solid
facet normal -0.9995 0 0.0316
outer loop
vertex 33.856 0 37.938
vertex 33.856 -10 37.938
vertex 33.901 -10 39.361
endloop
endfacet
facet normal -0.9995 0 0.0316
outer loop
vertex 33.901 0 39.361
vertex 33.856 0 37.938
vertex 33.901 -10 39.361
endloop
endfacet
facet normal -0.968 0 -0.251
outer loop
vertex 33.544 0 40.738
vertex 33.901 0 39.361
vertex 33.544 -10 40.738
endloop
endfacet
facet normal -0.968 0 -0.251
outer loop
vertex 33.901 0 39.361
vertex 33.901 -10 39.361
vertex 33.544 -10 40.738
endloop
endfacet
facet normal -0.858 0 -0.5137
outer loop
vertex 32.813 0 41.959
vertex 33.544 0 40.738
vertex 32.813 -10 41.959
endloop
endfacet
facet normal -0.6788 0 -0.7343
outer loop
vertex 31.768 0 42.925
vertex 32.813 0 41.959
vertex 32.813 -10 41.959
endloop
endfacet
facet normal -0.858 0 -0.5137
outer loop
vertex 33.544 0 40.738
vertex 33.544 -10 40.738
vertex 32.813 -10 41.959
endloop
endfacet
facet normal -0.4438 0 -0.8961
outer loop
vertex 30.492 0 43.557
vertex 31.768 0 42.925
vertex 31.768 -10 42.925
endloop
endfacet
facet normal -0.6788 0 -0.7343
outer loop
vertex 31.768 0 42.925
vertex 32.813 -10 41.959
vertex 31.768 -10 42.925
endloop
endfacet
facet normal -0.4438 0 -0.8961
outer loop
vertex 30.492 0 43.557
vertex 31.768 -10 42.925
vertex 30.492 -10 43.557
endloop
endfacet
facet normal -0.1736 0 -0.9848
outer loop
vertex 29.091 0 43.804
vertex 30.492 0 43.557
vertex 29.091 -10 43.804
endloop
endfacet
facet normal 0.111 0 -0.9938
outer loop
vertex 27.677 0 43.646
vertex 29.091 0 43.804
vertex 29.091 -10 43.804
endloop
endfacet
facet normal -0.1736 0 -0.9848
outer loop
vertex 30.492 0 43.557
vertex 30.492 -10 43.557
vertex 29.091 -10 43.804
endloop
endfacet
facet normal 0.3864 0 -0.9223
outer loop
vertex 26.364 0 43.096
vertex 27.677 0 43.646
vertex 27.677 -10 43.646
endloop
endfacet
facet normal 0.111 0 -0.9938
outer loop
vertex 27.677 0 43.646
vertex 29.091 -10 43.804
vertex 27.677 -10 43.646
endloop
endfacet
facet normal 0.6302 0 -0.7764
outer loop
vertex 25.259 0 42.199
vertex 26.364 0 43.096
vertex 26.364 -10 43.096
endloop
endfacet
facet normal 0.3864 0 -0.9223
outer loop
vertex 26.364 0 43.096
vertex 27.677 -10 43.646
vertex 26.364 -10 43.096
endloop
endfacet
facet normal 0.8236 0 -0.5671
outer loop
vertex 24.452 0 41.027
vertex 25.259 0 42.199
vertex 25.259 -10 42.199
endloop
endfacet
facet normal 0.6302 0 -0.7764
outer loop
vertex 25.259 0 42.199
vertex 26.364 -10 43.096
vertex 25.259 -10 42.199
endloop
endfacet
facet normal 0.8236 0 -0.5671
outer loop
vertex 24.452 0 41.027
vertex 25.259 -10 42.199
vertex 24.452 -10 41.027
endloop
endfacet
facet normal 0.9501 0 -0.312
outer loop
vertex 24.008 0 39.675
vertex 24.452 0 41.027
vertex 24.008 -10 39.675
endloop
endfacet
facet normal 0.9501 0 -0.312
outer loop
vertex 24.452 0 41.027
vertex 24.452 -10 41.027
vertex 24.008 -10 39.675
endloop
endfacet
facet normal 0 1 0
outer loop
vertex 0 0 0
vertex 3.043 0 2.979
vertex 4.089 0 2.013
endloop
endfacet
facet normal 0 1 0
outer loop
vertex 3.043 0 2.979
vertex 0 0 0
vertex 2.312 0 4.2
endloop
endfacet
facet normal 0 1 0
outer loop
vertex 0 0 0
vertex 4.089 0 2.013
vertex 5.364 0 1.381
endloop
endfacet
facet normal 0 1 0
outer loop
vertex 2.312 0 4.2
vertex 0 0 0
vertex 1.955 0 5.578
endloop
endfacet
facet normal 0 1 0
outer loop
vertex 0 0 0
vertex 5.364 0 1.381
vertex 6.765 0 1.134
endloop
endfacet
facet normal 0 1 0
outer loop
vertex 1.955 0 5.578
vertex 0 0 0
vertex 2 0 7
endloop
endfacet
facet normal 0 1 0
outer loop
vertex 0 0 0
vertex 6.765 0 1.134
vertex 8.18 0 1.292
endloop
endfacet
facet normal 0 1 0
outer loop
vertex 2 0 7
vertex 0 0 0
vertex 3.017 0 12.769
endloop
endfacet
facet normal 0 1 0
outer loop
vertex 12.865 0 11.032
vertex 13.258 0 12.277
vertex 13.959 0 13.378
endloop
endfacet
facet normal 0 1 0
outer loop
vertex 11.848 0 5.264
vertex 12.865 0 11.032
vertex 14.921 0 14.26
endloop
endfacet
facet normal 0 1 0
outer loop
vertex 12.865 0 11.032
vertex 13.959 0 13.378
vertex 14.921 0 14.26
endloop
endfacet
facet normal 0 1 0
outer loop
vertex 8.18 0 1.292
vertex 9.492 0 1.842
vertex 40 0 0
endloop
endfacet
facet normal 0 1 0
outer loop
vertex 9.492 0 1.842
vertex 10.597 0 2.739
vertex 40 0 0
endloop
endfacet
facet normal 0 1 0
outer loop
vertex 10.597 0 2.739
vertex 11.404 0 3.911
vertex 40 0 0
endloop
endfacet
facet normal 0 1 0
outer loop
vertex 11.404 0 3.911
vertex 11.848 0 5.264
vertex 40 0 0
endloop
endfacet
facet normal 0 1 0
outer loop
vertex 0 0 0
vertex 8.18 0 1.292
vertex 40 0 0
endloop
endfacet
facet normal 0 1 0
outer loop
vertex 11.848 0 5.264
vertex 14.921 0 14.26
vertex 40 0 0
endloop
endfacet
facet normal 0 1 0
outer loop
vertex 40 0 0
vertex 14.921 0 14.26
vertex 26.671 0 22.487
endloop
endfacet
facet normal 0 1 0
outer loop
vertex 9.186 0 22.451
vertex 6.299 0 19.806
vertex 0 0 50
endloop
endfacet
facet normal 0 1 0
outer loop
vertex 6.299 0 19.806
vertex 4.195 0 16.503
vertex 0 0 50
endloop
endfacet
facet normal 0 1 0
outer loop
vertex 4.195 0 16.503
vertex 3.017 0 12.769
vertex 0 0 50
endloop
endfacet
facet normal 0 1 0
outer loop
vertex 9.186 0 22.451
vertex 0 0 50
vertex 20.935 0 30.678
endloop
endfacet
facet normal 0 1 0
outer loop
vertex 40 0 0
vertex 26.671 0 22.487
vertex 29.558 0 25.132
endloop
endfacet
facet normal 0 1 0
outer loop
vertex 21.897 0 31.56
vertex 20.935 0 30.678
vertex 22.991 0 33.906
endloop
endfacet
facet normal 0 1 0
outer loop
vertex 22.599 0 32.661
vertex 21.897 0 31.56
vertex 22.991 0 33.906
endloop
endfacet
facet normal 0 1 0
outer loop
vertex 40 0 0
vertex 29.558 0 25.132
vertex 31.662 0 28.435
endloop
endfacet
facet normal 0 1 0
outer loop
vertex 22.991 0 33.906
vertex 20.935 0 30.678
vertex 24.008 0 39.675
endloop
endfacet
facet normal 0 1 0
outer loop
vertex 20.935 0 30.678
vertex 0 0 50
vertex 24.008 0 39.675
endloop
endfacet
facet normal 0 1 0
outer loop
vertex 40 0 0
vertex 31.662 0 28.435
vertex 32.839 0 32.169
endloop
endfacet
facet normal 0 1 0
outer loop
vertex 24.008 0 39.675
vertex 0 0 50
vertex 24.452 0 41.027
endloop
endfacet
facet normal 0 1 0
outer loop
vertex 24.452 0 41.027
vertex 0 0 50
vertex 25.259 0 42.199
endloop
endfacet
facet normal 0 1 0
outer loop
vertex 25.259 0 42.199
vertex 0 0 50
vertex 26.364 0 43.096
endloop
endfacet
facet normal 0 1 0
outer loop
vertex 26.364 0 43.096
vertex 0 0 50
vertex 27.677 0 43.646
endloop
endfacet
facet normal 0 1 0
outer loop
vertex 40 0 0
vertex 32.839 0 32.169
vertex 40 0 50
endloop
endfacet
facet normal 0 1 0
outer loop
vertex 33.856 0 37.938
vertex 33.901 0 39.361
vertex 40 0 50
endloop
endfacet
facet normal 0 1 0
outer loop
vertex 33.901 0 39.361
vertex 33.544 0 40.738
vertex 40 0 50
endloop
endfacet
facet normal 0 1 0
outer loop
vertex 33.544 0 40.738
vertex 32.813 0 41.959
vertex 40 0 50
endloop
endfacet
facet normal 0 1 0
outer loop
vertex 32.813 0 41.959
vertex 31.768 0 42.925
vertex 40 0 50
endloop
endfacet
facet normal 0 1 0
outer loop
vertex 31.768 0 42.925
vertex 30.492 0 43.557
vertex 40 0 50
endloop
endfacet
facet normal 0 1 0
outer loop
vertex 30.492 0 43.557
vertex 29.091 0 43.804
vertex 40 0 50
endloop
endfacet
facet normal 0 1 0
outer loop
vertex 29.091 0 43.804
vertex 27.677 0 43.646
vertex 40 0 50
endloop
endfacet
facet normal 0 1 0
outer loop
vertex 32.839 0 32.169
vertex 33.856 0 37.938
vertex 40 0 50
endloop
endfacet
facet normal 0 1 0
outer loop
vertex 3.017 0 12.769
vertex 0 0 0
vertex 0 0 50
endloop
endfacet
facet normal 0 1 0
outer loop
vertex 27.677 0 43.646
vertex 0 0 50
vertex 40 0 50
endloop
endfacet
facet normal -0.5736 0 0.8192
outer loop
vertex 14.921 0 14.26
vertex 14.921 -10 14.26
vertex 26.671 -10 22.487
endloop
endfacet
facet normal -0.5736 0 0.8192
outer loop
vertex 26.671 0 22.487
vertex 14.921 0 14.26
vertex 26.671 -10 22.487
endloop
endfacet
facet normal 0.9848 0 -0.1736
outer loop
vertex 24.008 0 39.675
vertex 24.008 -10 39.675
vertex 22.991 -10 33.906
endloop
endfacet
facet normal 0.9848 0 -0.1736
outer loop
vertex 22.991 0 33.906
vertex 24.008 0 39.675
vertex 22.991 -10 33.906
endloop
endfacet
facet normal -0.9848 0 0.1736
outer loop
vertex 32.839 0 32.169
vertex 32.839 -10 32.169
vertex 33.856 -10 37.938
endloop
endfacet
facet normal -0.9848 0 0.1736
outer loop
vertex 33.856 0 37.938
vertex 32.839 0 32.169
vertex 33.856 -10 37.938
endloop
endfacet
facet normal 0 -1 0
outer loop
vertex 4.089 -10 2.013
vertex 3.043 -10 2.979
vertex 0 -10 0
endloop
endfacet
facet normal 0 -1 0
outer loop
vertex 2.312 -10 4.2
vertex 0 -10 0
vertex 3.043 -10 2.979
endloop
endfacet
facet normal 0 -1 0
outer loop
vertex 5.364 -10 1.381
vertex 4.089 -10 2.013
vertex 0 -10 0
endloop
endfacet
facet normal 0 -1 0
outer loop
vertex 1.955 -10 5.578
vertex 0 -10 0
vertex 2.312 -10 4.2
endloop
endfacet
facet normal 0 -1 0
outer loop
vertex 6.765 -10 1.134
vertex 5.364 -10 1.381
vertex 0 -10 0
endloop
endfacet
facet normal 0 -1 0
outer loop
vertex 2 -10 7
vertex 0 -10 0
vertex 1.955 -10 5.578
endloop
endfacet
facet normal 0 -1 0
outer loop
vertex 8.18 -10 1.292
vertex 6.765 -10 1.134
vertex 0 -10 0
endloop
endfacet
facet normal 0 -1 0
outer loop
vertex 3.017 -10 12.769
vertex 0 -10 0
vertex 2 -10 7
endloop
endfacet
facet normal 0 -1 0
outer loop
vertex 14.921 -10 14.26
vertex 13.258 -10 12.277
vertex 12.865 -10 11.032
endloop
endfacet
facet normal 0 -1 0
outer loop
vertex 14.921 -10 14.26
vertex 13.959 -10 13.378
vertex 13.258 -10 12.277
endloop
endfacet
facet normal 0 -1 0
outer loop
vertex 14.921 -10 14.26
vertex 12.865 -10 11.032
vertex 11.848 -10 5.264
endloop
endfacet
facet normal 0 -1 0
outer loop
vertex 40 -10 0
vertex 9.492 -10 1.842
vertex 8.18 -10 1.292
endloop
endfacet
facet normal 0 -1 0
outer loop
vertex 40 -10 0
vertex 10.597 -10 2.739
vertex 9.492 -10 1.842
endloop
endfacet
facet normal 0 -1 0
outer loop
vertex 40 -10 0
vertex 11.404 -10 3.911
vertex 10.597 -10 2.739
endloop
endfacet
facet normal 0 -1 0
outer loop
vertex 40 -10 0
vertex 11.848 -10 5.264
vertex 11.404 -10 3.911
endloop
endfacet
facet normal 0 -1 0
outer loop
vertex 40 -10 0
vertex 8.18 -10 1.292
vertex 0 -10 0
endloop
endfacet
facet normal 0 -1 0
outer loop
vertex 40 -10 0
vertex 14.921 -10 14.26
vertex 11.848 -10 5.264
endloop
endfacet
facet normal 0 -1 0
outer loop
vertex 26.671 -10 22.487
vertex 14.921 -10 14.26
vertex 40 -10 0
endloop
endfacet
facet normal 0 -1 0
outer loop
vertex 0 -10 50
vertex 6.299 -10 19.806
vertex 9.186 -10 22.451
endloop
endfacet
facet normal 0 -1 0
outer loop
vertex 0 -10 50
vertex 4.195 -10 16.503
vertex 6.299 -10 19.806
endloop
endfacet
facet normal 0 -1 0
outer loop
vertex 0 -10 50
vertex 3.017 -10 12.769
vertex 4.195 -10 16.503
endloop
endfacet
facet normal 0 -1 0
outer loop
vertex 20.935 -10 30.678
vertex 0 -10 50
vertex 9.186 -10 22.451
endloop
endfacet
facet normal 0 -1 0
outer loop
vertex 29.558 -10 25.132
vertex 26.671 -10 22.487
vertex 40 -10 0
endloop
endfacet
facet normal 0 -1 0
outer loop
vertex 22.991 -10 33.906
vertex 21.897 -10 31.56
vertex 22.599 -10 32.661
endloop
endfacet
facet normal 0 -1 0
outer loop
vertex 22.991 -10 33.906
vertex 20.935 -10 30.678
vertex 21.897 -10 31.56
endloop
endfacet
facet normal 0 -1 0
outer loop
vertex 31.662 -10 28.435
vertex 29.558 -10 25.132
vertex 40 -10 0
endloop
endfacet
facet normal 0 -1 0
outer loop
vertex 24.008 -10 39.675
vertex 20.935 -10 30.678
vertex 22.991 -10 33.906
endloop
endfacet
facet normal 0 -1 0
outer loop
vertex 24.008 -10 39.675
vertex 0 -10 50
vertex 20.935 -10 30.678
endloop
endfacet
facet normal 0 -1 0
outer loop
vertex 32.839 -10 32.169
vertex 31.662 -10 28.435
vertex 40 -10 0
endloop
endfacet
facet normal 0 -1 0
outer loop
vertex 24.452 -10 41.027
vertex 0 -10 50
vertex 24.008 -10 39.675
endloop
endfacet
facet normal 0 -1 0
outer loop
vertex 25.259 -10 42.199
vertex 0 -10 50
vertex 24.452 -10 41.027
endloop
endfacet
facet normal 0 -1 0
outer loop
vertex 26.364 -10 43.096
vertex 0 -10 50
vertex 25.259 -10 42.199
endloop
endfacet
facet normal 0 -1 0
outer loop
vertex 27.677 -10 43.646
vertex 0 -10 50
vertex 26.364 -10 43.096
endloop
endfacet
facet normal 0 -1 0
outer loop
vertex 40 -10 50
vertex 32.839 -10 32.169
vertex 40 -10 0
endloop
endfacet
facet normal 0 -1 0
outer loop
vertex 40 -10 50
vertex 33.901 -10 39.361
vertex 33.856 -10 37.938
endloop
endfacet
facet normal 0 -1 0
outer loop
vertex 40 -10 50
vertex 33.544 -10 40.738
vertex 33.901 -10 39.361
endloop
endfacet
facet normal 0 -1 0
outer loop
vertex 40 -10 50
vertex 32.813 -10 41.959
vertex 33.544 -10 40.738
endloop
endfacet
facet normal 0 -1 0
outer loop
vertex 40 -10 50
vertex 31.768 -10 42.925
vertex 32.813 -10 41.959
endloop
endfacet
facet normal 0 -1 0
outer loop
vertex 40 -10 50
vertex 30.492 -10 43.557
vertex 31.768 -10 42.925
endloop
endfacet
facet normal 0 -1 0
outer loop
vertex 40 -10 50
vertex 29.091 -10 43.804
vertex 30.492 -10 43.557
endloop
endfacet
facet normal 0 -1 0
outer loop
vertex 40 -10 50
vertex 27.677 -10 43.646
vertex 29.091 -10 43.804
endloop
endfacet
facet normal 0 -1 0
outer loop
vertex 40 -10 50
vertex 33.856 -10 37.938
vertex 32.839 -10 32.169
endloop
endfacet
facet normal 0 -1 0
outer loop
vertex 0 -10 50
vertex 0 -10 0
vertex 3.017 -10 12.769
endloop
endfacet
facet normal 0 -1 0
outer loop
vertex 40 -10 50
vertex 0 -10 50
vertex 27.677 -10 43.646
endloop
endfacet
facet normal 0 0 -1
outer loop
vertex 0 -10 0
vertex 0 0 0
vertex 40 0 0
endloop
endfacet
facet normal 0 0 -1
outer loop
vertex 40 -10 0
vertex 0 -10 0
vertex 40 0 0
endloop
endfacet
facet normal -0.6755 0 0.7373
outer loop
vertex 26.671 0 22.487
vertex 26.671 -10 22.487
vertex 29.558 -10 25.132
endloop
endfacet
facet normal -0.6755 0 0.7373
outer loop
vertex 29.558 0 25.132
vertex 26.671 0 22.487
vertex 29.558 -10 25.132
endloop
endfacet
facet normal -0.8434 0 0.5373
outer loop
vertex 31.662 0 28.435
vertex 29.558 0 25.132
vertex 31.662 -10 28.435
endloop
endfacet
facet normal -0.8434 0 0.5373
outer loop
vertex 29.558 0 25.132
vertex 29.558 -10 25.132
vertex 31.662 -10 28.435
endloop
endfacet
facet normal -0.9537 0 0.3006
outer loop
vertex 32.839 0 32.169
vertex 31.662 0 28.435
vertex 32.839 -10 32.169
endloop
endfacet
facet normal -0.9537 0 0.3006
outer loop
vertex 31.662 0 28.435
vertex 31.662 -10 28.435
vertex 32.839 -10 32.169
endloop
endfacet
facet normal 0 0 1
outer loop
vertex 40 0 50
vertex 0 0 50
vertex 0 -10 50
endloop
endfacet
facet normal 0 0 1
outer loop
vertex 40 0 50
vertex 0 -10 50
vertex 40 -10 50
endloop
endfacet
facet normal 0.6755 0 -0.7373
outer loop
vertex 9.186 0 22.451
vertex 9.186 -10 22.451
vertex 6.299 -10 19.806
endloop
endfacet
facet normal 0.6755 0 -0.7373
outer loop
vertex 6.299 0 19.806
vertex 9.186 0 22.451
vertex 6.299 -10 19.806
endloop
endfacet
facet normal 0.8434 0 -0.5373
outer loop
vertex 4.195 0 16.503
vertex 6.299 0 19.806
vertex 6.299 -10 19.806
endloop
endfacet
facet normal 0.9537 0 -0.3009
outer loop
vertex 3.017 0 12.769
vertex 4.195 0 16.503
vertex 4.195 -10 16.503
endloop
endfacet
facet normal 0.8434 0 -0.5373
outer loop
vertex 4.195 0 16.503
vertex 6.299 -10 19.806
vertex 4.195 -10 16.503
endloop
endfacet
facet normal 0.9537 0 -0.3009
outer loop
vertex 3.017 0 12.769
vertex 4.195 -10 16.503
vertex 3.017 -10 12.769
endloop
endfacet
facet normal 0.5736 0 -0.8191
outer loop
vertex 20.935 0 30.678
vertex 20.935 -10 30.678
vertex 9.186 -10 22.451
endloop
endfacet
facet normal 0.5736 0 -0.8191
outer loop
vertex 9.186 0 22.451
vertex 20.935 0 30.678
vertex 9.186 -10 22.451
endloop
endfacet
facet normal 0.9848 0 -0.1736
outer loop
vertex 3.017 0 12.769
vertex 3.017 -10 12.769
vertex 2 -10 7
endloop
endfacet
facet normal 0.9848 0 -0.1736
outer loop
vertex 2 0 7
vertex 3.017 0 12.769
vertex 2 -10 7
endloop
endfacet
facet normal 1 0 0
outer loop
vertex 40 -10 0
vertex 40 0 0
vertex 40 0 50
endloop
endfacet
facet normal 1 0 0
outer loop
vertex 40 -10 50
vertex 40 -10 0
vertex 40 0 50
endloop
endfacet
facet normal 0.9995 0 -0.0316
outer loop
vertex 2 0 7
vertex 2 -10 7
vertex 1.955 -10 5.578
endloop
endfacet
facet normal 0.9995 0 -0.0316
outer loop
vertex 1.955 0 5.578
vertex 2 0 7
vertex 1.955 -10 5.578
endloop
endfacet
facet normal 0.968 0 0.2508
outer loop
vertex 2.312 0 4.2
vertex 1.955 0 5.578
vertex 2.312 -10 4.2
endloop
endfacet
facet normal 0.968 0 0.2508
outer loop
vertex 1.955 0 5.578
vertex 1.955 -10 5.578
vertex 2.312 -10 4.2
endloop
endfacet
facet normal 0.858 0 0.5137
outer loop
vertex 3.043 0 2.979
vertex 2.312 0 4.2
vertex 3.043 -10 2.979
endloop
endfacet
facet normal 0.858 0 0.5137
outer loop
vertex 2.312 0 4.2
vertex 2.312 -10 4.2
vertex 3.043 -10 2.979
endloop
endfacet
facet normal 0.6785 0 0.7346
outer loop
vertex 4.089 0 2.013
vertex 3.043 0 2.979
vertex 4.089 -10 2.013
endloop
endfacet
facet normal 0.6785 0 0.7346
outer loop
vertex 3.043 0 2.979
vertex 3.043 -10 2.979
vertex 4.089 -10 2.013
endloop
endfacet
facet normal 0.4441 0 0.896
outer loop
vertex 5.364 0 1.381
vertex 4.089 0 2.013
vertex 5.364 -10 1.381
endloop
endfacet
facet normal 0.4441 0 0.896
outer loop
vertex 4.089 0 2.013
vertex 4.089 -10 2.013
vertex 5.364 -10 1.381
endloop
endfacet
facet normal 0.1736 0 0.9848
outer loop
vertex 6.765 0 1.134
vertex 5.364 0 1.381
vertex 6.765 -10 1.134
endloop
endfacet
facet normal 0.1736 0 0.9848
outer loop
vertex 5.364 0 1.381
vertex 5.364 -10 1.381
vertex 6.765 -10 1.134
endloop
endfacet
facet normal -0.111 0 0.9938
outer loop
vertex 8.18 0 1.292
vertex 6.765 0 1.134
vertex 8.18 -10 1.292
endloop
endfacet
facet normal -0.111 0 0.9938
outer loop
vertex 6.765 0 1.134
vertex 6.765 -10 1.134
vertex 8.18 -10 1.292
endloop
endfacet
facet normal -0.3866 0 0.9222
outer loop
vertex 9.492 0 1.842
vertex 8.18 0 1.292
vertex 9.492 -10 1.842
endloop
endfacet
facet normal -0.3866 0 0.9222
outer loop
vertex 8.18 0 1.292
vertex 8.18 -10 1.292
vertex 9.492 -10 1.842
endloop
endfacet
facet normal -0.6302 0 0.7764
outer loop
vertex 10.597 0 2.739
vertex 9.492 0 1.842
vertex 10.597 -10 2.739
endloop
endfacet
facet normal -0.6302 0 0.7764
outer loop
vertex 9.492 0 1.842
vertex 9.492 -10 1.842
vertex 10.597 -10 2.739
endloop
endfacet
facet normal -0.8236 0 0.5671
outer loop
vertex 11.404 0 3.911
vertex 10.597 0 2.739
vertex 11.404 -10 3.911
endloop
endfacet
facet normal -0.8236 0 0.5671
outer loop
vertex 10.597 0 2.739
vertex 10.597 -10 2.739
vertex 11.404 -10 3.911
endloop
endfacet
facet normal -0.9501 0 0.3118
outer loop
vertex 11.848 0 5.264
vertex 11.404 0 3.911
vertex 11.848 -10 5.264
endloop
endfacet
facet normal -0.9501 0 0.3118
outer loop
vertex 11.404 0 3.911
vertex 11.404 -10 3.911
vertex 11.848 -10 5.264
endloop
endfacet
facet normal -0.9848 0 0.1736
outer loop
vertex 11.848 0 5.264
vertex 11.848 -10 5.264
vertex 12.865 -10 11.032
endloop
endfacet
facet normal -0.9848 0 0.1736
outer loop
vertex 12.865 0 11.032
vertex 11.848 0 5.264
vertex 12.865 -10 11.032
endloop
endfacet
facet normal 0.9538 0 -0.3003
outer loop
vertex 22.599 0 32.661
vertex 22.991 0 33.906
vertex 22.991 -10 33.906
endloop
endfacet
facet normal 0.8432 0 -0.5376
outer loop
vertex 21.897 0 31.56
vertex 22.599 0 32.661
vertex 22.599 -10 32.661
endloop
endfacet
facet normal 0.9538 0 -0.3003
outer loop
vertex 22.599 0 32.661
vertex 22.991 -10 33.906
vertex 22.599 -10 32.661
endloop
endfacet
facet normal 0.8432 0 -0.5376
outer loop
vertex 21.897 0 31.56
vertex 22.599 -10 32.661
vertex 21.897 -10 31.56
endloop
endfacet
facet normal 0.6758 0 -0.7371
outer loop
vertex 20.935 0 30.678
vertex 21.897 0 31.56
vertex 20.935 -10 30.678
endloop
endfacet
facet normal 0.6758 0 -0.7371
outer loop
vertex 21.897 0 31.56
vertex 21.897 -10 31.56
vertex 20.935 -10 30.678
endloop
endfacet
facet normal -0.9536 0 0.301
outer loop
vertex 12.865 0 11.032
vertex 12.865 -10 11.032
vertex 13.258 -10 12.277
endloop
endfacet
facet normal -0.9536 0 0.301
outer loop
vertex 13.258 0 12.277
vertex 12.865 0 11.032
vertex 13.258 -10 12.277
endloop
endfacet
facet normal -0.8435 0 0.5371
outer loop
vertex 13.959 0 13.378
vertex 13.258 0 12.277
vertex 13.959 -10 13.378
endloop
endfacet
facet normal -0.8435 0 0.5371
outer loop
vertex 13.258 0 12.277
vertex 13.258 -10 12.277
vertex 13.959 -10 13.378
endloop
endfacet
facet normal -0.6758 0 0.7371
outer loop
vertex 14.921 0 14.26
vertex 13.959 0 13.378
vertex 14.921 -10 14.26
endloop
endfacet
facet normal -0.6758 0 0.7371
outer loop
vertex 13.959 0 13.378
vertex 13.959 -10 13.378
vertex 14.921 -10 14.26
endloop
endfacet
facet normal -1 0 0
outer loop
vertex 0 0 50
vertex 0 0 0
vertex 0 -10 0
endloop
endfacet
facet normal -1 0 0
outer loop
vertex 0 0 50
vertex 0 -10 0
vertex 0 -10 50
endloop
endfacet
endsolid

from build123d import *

# Parameters (mm, degrees)
F0_W     = 40
F0_H     = 50
F1_DEPTH = 10
F3_DEPTH = 10.001


with BuildPart() as f1:
    # F0 (on Front) → F1 (new body)
    with BuildSketch(Plane.XZ):
        with Locations((20, 25)):
            Rectangle(F0_W, F0_H)
    extrude(amount=F1_DEPTH)

    # F2 (on face) → F3 (cut, through all)
    with BuildSketch(Plane.XZ.offset(10)):
        with BuildLine():
            Line((3.017207, 12.76887), (2, 7))
            ThreePointArc((2, 7), (6.055798, 1.20772), (11.848078, 5.263518))
            Line((11.848078, 5.263518), (12.865285, 11.032388))
            ThreePointArc((12.865285, 11.032388), (13.572367, 12.850646), (14.921442, 14.259908))
            Line((14.921442, 14.259908), (26.670659, 22.486798))
            ThreePointArc((26.670659, 22.486798), (30.717884, 26.714585), (32.839129, 32.169356))
            Line((32.839129, 32.169356), (33.856336, 37.938226))
            ThreePointArc((33.856336, 37.938226), (29.800538, 43.730506), (24.008258, 39.674708))
            Line((24.008258, 39.674708), (22.991051, 33.905838))
            ThreePointArc((22.991051, 33.905838), (22.283969, 32.087581), (20.934894, 30.678319))
            Line((20.934894, 30.678319), (9.185677, 22.451428))
            ThreePointArc((9.185677, 22.451428), (5.138452, 18.223642), (3.017207, 12.76887))
        make_face()
    extrude(amount=-F3_DEPTH, mode=Mode.SUBTRACT)


solid = f1.part
